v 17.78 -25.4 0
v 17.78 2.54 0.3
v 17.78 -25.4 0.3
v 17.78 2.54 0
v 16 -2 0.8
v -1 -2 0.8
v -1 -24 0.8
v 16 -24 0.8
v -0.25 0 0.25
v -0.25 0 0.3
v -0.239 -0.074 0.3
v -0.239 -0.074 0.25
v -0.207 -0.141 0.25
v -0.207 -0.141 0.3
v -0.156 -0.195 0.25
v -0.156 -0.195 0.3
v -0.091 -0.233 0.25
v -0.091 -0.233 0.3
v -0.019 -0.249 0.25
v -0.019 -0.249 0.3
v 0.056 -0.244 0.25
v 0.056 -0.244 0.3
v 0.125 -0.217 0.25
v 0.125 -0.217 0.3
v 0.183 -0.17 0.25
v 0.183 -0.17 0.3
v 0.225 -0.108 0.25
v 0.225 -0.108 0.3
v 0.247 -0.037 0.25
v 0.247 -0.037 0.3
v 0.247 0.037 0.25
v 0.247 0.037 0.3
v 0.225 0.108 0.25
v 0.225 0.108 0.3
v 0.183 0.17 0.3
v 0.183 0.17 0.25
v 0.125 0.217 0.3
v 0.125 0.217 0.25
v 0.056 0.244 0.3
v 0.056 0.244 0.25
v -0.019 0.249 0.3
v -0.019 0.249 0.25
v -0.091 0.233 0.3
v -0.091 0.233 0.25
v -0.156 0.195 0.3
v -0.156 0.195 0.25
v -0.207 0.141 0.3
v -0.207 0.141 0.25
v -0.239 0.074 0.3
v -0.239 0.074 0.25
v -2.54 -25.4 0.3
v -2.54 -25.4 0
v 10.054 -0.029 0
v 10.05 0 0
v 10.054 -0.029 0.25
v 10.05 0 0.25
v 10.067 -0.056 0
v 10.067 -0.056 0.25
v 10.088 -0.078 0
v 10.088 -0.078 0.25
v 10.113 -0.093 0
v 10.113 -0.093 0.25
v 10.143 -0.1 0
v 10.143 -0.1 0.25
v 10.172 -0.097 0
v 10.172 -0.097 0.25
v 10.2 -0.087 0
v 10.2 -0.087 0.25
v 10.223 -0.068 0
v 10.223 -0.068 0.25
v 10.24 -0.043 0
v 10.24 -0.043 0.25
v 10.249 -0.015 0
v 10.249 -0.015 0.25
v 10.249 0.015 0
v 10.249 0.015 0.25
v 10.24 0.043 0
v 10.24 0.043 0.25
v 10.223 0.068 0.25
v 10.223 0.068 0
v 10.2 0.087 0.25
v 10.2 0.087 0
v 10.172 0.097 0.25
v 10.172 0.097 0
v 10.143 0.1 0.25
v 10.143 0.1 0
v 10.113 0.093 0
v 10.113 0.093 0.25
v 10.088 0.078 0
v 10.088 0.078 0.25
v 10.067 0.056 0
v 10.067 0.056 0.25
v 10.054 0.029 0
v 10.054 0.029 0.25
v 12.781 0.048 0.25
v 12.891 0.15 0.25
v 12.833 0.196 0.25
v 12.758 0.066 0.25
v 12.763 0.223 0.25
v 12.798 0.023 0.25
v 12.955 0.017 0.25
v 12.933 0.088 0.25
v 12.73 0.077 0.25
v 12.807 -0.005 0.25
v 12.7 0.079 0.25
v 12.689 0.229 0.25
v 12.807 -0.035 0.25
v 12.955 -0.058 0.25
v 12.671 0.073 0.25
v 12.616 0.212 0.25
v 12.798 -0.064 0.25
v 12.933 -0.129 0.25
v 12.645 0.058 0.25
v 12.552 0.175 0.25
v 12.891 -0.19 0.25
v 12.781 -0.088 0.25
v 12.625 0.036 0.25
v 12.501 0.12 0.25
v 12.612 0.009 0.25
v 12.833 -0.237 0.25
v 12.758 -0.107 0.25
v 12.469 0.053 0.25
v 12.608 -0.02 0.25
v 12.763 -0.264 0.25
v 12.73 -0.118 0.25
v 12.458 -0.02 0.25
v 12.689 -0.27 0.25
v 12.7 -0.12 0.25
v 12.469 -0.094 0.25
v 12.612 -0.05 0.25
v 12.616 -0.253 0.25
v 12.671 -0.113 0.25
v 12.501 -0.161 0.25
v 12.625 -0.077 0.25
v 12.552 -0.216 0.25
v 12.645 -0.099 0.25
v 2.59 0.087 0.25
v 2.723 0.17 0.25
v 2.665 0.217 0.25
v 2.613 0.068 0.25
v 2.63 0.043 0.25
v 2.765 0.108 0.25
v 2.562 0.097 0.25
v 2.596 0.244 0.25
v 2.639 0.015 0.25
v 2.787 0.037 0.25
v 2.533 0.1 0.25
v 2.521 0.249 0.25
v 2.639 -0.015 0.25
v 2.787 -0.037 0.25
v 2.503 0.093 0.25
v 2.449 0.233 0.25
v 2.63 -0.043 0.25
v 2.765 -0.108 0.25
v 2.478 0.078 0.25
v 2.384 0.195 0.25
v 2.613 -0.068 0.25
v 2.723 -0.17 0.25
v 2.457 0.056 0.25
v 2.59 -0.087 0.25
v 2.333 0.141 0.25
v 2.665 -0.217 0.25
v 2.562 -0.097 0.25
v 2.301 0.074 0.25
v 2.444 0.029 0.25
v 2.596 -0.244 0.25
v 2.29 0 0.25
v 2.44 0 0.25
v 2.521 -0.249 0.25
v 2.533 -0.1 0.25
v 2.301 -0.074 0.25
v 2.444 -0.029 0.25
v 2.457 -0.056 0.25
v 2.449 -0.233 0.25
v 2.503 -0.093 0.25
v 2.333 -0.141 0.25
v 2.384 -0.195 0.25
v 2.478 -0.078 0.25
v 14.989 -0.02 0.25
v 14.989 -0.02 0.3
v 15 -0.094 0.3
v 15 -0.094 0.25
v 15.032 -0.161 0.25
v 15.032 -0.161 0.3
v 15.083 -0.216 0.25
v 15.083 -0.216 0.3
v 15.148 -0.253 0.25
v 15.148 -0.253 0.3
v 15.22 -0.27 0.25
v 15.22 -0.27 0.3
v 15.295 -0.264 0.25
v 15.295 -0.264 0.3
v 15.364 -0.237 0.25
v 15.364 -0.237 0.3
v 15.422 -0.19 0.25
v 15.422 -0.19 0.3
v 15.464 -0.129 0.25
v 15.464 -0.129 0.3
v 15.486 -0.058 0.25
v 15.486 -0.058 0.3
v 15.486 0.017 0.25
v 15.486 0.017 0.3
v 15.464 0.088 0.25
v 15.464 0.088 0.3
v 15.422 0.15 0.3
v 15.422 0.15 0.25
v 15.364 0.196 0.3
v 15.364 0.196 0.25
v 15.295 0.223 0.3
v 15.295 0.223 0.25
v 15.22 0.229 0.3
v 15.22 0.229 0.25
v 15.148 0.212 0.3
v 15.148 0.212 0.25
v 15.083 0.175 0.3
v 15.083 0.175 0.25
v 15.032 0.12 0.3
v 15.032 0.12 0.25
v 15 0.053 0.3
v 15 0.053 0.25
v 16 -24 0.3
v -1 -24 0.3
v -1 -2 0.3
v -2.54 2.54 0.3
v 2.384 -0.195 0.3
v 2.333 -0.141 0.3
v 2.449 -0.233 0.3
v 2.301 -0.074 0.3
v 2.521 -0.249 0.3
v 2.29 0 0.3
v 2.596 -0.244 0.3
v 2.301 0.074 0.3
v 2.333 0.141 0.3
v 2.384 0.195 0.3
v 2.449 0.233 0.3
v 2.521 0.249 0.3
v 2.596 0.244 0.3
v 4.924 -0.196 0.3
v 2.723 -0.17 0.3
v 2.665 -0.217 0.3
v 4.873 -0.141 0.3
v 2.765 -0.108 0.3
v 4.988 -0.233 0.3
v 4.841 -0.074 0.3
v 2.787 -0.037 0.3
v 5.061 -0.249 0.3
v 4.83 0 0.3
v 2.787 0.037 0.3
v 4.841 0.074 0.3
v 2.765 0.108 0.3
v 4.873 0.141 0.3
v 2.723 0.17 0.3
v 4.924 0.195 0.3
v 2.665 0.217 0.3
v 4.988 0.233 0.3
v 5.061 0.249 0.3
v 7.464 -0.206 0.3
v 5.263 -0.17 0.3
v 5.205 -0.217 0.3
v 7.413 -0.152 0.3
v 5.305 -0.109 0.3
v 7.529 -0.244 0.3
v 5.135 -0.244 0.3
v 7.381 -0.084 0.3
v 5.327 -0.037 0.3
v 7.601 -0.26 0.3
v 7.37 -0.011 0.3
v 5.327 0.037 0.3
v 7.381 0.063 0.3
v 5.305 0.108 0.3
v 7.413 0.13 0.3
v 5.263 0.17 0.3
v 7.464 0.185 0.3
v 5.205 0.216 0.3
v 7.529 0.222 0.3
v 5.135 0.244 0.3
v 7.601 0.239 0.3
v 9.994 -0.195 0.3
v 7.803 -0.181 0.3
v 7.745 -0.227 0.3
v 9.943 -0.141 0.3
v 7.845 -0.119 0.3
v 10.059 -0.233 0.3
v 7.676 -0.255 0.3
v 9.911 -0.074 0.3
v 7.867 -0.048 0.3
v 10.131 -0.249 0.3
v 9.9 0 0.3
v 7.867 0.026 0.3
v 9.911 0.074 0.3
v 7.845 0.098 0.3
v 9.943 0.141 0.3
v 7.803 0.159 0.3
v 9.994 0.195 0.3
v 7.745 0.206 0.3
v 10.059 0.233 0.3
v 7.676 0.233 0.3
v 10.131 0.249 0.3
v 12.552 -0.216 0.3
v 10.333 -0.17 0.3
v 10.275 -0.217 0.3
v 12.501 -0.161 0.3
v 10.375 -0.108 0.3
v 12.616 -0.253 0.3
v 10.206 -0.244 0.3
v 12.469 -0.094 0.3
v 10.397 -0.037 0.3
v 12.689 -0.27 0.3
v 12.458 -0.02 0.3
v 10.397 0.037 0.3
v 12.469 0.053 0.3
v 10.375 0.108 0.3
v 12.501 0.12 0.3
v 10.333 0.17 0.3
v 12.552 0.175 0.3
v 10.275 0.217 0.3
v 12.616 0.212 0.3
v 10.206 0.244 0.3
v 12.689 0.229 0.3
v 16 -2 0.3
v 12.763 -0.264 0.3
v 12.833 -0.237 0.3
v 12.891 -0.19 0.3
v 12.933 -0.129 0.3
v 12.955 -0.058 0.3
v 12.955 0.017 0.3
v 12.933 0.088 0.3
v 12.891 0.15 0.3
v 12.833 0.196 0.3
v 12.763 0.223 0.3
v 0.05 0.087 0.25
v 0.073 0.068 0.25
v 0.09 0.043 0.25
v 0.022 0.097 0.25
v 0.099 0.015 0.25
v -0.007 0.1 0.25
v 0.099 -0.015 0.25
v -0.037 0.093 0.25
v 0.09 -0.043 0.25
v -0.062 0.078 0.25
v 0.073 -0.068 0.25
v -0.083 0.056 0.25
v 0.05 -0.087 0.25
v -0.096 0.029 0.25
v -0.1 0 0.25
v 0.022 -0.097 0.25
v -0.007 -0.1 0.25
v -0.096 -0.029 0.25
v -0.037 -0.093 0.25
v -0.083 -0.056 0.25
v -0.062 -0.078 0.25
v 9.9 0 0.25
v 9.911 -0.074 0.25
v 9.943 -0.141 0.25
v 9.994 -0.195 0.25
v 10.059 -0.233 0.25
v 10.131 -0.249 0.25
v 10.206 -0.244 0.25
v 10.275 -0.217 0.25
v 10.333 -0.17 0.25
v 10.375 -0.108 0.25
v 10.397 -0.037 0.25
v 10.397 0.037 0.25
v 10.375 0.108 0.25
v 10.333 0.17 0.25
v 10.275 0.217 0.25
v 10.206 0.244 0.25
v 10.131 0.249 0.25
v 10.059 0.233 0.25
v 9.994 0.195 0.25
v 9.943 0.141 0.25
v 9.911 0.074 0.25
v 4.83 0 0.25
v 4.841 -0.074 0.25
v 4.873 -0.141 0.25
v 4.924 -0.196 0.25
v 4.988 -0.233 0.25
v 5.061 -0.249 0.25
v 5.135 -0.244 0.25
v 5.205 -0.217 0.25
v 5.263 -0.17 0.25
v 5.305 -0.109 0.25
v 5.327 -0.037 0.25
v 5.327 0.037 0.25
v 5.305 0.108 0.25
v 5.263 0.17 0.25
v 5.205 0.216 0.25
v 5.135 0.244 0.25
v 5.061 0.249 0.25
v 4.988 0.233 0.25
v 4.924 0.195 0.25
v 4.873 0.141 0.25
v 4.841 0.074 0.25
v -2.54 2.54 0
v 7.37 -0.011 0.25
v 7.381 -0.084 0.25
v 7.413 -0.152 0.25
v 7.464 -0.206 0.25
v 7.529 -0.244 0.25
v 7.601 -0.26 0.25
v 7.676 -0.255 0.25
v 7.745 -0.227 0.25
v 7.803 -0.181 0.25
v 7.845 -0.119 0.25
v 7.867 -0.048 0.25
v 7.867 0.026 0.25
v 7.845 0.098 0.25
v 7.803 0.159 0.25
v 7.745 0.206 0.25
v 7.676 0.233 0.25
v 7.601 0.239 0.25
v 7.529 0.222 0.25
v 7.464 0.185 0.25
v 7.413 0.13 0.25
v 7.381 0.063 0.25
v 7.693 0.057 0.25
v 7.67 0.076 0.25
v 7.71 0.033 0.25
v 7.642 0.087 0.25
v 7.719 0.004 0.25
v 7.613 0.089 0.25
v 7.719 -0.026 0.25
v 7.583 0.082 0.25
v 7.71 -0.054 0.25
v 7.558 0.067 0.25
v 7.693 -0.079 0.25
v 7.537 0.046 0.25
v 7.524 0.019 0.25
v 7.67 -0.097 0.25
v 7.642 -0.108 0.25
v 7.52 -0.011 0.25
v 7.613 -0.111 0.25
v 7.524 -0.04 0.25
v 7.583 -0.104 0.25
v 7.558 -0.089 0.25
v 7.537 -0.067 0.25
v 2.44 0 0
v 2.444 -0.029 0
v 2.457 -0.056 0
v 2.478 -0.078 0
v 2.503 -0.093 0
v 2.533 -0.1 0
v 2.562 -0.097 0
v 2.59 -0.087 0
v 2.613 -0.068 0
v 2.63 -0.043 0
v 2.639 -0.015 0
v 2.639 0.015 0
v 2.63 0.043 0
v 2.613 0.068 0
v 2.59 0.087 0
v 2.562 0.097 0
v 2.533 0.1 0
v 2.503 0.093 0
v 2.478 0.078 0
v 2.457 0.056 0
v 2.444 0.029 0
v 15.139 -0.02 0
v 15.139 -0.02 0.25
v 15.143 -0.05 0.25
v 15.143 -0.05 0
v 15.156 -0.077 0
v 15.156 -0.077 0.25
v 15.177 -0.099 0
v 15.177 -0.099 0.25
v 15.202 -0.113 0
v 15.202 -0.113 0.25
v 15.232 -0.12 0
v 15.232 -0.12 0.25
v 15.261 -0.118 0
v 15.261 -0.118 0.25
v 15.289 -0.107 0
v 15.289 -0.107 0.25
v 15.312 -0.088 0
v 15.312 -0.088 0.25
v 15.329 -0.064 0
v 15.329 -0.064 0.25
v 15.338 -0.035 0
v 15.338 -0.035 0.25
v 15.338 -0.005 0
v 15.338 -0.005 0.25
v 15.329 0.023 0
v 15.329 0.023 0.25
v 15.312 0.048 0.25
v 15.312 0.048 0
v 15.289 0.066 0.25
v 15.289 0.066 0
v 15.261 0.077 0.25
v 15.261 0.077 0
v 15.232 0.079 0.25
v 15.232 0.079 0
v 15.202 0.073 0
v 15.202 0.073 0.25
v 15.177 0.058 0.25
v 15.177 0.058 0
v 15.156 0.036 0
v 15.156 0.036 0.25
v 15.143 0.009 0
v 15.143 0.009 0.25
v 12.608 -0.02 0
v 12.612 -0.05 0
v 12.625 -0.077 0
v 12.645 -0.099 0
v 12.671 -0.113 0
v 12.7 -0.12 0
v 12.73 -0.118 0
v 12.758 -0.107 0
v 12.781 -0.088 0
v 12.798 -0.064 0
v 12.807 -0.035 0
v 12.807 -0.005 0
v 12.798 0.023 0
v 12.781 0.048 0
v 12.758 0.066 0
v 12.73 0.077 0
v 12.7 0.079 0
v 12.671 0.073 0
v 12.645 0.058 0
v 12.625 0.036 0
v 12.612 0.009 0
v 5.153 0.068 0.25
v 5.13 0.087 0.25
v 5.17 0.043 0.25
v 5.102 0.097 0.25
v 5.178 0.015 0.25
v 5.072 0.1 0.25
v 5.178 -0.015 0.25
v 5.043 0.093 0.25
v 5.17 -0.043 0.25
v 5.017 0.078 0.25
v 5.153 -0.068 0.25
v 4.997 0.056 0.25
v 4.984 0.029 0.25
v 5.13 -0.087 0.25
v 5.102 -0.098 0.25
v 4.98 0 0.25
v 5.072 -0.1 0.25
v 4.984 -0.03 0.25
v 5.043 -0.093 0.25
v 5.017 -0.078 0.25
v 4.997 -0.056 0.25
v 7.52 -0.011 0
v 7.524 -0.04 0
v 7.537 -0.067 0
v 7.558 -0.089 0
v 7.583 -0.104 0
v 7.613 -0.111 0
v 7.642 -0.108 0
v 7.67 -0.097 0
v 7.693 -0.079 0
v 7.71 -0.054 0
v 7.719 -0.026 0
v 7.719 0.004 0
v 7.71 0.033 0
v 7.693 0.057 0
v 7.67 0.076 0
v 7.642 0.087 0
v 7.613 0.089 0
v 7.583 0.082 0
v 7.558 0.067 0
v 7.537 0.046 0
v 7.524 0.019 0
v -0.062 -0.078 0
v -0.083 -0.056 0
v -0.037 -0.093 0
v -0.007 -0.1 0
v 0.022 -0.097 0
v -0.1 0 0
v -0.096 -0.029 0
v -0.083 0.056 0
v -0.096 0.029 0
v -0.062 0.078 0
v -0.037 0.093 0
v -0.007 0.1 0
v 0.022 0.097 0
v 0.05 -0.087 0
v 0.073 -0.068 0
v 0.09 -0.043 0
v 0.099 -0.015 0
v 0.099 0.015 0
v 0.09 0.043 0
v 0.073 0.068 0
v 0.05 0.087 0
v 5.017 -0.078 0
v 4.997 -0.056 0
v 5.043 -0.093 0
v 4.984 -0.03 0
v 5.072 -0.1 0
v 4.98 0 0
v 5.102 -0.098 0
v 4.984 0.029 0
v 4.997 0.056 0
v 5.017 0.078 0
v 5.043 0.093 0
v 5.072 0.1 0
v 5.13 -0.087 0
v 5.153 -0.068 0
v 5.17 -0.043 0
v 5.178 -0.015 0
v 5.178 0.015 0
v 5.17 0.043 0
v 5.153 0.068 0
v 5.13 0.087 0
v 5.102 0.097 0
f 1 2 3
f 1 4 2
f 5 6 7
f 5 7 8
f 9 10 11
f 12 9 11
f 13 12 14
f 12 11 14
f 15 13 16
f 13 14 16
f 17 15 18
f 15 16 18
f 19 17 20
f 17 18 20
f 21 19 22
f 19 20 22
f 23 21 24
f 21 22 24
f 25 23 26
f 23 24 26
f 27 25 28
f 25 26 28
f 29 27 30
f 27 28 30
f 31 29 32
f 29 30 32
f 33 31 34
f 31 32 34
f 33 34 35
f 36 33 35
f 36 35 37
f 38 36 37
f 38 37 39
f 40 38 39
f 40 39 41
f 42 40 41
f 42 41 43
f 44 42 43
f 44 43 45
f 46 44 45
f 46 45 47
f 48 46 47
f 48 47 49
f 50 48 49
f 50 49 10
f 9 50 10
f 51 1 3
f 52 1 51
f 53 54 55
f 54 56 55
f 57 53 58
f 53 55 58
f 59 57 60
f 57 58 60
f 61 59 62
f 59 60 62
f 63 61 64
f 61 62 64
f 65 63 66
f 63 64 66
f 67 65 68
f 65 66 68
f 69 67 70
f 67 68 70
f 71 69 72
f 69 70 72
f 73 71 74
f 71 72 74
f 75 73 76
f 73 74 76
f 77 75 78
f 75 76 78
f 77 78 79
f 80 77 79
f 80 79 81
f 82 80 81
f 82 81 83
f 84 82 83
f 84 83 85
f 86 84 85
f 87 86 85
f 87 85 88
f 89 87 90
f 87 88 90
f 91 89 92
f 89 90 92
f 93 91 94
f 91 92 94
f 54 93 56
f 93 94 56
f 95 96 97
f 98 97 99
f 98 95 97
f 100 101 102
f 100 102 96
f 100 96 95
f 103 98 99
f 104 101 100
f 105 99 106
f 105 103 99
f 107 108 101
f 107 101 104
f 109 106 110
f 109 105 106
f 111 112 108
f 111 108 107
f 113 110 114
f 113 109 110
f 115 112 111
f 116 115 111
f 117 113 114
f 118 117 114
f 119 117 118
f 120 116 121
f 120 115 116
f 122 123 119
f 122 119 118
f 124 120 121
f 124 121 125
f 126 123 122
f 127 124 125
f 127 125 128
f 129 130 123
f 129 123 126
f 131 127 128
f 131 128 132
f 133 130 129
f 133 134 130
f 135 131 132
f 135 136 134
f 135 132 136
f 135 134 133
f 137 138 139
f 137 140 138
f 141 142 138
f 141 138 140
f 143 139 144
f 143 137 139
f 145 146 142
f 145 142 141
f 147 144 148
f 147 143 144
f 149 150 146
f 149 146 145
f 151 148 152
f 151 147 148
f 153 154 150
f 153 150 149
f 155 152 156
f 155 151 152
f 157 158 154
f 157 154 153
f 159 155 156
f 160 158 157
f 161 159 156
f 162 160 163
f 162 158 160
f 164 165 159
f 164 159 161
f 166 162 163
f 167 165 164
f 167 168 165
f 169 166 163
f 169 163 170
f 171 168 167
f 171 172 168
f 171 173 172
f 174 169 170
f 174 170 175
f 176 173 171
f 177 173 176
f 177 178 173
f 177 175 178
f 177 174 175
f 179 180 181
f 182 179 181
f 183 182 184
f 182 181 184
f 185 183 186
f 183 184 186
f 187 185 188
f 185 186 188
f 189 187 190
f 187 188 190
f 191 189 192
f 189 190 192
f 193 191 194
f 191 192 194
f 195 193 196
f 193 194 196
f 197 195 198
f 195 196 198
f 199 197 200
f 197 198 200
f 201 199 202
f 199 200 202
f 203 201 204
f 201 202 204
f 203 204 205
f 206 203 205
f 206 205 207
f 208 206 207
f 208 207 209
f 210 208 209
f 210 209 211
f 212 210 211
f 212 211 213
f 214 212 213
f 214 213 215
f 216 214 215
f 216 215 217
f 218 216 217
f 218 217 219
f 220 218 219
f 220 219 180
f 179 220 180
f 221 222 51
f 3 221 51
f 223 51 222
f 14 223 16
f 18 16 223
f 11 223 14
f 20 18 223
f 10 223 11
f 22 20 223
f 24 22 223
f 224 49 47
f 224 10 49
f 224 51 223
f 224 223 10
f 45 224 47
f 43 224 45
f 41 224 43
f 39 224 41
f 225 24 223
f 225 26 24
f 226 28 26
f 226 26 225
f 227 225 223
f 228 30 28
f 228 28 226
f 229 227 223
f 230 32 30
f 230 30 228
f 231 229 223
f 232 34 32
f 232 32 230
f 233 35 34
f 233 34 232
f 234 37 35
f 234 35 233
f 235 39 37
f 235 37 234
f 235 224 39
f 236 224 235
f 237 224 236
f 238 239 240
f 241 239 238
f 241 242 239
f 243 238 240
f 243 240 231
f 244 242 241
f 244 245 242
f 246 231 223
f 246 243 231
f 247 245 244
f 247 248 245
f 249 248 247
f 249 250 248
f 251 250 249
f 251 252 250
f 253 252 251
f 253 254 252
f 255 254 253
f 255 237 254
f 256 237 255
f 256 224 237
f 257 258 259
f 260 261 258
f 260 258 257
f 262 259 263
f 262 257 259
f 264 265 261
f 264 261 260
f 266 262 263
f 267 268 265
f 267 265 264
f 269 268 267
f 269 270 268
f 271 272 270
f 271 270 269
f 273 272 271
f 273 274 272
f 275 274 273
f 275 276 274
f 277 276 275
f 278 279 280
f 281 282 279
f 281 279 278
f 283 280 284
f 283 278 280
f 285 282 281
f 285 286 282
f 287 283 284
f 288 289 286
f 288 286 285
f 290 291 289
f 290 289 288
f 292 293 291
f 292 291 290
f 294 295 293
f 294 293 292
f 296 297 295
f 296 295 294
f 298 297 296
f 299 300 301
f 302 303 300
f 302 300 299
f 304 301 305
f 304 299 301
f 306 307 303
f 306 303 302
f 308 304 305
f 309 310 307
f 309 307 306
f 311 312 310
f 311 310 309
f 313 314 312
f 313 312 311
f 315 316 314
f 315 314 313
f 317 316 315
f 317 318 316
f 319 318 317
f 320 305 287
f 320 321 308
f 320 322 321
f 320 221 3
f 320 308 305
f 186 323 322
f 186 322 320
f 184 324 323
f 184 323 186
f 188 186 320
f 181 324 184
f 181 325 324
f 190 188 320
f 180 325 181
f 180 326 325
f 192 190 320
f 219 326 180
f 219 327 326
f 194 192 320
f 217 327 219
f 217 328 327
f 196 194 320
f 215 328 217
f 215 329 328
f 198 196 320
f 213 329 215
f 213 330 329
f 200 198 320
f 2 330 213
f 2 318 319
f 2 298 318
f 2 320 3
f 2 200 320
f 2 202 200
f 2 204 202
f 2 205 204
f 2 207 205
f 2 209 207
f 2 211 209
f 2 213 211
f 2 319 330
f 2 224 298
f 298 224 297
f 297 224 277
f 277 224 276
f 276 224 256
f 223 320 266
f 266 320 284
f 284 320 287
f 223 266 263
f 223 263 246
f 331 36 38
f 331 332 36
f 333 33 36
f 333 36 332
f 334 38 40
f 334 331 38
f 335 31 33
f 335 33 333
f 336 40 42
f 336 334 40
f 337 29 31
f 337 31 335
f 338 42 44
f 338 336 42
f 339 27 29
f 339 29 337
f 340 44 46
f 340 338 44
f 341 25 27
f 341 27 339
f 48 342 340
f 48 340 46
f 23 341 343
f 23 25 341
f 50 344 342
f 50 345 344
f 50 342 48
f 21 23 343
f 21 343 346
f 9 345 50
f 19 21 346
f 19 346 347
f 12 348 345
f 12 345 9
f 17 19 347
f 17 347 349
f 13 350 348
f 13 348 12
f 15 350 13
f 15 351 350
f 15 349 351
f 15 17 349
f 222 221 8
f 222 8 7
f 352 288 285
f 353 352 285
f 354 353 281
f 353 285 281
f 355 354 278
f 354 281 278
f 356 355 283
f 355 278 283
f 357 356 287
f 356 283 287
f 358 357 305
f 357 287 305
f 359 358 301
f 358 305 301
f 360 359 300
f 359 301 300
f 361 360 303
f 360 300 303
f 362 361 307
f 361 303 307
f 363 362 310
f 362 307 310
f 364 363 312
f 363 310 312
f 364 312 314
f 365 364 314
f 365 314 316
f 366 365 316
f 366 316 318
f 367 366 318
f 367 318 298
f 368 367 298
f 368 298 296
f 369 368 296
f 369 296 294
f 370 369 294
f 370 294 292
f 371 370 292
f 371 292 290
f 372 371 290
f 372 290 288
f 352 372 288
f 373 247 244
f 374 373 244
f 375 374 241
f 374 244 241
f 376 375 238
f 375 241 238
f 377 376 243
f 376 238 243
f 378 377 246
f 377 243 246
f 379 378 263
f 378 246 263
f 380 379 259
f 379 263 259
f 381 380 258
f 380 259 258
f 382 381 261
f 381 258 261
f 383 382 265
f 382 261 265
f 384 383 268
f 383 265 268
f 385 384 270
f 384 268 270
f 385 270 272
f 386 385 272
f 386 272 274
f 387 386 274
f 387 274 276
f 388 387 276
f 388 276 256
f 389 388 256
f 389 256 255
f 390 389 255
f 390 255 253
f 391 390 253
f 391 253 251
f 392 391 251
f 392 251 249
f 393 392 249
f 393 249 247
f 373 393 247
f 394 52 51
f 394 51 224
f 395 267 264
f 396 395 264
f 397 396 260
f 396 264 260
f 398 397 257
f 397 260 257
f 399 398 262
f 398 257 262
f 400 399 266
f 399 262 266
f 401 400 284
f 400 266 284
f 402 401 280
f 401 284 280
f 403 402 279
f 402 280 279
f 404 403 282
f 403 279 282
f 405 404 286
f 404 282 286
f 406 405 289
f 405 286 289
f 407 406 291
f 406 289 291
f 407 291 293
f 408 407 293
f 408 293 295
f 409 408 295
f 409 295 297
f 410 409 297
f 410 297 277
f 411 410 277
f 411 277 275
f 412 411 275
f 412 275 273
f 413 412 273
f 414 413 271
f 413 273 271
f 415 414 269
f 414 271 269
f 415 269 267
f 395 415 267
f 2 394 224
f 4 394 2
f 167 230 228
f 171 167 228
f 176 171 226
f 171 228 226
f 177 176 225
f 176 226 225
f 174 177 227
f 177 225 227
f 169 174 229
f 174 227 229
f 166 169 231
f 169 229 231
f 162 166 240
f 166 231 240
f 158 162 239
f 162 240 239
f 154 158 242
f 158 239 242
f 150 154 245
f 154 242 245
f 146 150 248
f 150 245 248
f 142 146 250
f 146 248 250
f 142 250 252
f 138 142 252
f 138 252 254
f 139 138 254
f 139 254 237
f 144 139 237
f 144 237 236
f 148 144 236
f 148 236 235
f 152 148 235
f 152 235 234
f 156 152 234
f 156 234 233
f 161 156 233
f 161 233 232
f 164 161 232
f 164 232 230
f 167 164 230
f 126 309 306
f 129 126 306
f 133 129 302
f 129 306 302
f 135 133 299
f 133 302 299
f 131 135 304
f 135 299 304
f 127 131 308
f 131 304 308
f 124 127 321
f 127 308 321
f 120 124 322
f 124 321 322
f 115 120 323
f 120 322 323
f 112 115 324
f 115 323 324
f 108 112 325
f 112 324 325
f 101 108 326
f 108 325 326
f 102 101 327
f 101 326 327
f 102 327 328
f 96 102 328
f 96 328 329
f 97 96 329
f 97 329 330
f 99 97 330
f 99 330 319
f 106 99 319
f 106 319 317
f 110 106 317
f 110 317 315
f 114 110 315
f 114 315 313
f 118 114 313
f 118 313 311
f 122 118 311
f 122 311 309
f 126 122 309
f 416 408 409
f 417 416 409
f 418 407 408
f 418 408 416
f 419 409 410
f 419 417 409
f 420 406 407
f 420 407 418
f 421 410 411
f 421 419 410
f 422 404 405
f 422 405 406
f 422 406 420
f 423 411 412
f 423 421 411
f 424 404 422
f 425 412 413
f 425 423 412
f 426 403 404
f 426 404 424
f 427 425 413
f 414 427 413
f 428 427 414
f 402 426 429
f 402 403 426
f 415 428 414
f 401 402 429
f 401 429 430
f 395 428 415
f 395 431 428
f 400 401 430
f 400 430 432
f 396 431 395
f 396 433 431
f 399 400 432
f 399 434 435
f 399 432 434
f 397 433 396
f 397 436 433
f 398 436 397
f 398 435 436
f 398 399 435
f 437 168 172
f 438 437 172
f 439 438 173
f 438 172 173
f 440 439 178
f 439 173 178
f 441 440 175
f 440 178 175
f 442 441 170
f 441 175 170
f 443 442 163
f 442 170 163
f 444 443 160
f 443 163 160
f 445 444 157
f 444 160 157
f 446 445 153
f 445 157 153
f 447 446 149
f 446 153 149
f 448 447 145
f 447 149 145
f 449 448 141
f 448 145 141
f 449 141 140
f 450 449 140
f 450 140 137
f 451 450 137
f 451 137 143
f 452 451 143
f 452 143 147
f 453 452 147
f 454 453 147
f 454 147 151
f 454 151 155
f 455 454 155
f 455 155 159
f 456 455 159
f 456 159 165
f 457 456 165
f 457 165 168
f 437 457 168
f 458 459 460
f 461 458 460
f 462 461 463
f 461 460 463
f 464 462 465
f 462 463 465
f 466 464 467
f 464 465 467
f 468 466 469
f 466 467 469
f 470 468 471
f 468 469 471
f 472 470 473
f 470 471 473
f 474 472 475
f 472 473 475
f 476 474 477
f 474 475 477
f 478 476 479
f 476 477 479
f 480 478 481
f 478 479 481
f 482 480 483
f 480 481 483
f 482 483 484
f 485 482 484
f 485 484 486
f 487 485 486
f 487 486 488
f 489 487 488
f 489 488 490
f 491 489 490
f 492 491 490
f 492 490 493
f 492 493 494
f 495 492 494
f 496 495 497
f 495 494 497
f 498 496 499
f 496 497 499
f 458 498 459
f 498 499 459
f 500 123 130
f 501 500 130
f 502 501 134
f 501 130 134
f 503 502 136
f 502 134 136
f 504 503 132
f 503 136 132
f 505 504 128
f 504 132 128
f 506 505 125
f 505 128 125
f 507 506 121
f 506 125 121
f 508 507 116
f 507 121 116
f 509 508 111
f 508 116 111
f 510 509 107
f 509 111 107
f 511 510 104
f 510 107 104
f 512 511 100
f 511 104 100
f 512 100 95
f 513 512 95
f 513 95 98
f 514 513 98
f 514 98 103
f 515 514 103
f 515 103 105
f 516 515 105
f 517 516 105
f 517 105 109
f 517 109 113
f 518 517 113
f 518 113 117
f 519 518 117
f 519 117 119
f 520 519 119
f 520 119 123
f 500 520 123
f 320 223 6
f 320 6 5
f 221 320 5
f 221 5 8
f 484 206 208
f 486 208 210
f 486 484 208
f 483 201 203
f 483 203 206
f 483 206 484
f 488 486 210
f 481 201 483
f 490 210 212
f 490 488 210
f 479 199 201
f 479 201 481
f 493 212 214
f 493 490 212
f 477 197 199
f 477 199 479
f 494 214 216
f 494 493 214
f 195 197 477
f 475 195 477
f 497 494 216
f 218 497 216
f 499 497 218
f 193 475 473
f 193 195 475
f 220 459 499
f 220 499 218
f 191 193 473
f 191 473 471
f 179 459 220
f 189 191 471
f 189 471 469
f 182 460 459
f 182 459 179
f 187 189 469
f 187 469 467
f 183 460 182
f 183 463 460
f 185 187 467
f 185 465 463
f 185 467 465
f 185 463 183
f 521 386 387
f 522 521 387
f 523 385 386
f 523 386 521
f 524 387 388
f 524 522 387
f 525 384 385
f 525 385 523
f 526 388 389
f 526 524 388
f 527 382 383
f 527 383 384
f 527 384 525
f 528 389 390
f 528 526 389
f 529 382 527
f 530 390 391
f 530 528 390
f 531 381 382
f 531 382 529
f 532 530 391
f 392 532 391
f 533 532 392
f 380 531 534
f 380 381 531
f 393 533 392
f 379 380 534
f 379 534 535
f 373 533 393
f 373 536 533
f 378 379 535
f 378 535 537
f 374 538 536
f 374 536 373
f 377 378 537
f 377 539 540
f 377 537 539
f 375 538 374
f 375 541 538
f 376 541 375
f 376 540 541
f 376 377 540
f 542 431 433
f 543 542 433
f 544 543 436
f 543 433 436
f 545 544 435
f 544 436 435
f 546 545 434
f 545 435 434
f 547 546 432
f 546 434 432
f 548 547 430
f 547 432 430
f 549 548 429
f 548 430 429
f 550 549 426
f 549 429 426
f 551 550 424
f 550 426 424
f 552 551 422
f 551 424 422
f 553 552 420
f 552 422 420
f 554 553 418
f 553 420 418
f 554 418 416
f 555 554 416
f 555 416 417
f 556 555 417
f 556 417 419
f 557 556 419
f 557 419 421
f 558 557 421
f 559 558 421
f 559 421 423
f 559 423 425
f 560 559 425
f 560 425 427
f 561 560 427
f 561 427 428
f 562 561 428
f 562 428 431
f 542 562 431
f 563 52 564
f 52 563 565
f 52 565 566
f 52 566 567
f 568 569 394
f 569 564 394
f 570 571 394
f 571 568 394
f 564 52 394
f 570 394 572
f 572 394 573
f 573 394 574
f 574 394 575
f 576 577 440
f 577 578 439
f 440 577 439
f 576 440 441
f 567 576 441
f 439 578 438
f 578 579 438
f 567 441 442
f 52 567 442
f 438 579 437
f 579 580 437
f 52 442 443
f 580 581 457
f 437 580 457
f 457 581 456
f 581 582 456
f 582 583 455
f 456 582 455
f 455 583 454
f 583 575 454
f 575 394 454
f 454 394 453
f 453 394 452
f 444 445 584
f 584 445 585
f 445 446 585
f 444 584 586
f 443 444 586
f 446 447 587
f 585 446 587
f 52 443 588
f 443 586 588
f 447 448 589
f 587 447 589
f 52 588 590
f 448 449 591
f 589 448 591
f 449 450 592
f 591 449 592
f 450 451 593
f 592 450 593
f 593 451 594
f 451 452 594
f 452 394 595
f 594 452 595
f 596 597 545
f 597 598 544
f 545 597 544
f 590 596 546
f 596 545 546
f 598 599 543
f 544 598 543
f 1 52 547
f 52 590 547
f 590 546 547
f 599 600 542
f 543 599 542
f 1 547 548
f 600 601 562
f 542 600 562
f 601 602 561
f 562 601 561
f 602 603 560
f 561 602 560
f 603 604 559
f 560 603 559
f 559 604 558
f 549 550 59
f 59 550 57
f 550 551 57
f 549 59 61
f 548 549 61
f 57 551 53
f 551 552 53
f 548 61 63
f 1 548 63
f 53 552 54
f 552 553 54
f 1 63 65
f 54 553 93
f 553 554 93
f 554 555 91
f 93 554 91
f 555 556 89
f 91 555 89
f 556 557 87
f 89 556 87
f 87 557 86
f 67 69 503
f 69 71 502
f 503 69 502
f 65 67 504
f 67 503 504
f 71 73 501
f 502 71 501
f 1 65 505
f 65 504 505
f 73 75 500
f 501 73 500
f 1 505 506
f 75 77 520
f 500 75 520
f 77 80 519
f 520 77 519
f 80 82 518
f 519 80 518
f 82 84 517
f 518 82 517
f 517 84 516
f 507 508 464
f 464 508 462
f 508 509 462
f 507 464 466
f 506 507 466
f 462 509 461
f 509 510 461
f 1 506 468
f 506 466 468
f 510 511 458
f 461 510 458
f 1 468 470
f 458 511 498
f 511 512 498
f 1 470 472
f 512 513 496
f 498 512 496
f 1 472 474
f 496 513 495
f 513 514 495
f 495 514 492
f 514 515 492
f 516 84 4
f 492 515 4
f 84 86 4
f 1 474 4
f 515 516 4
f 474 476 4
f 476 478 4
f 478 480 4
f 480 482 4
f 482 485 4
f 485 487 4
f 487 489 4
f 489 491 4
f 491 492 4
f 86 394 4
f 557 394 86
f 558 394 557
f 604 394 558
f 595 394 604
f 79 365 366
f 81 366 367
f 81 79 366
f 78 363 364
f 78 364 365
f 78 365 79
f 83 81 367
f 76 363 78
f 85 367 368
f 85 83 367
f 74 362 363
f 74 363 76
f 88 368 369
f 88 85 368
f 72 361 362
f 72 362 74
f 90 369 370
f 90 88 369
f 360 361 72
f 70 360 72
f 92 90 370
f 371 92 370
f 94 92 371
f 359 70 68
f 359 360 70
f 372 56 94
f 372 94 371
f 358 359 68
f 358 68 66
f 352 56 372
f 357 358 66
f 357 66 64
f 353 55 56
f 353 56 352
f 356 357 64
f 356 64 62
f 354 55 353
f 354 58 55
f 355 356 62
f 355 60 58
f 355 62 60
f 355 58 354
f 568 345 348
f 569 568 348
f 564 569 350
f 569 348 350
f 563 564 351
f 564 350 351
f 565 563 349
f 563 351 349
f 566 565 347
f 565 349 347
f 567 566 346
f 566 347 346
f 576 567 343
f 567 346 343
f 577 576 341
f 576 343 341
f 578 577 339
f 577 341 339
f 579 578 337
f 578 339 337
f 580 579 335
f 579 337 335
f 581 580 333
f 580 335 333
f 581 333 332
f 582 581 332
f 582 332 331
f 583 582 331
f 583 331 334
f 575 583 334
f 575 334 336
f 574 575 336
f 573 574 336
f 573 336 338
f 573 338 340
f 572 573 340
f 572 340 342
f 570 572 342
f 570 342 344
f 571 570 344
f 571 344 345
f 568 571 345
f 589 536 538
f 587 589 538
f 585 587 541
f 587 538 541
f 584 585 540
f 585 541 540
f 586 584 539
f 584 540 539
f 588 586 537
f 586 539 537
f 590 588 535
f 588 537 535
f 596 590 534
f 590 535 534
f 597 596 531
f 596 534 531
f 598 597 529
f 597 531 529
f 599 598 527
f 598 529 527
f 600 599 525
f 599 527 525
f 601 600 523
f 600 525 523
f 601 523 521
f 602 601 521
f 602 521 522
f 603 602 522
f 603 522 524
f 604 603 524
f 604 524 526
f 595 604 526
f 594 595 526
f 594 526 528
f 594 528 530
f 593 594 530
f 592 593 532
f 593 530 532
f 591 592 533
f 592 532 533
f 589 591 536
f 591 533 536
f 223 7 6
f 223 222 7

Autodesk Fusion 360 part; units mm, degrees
sketch "Esboço1" plane through (0, 0, 0) normal (0, 0, 1) x (1, 0, 0)
  line L0 (-2.54, 2.54) -> (17.78, 2.54)
  line L1 (17.78, 2.54) -> (17.78, -25.4)
  line L2 (17.78, -25.4) -> (-2.54, -25.4)
  line L3 (-2.54, -25.4) -> (-2.54, 2.54)
extrude "Extrusão1" add sketch "Esboço1" along normal blind 0.3
sketch "Esboço2" plane through (0, 0, 0) normal (0, 0, 1) x (1, 0, 0)
  line L0 (-1, -2) -> (16, -2)
  line L1 (16, -2) -> (16, -24)
  line L2 (16, -24) -> (-1, -24)
  line L3 (-1, -24) -> (-1, -2)
extrude "Extrusão2" add sketch "Esboço2" along normal blind 0.8
sketch "Esboço3" plane through (0, 0, 0.3) normal (0, 0, 1) x (-1, 0, 0)
  line L0 (1, 24) -> (1, 2)
  line L1 (1, 2) -> (-16, 2)
  line L2 (-16, 2) -> (-16, 24)
  line L3 (-16, 24) -> (1, 24)
  line L4 (2.54, 25.4) -> (-17.78, 25.4)
  line L5 (-17.78, 25.4) -> (-17.78, -2.54)
  line L6 (-17.78, -2.54) -> (2.54, -2.54)
  line L7 (2.54, -2.54) -> (2.54, 25.4)
  circle A0 centre (0, 0) radius 0.25
  circle A1 centre (-2.5, 0) radius 0.25
  curve A2
  circle A3 centre (-7.62, 0.0108) radius 0.25
  circle A4 centre (-10.15, 0) radius 0.25
  circle A5 centre (-12.7077, 0.0204) radius 0.25
  circle A6 centre (-15.239, 0.0204) radius 0.25
  dimension "d5" = 0.5
  dimension "d6" = 0.5
  dimension "d7" = 0.5
  dimension "d8" = 0.5
  dimension "d9" = 0.5
  dimension "d10" = 0.5
  dimension "d11" = 0.5
extrude "Extrusão3" cut sketch "Esboço3" against normal blind 0.05 contours A3 | A4 | A5 | A6
sketch "Esboço4" plane through (0, 0, 0.3) normal (0, 0, 1) x (-1, 0, 0)
  circle A0 centre (-12.7077, 0.0204) radius 0.25
  circle A1 centre (-10.15, 0) radius 0.25
  circle A2 centre (-15.239, 0.0204) radius 0.25
  circle A3 centre (-7.62, 0.0108) radius 0.25
  line L0 (1, 24) -> (1, 2)
  line L1 (1, 2) -> (-16, 2)
  line L2 (-16, 2) -> (-16, 24)
  line L3 (-16, 24) -> (1, 24)
  line L4 (2.54, 25.4) -> (-17.78, 25.4)
  line L5 (-17.78, 25.4) -> (-17.78, -2.54)
  line L6 (-17.78, -2.54) -> (2.54, -2.54)
  line L7 (2.54, -2.54) -> (2.54, 25.4)
  circle A4 centre (-5.0796, 0.0001) radius 0.25
  circle A5 centre (-2.54, 0) radius 0.25
  circle A6 centre (0, 0) radius 0.25
  dimension "d14" = 0.5
  dimension "d15" = 0.5
  dimension "d16" = 0.5
extrude "Extrusão4" cut sketch "Esboço4" against normal blind 0.05 contours A4 | A5 | A6
sketch "Esboço5" plane through (0, 0, 0.3) normal (0, 0, 1) x (-1, 0, 0)
  circle A0 centre (-5.0796, 0.0001) radius 0.25
  circle A1 centre (-2.54, 0) radius 0.25
  circle A2 centre (0, 0) radius 0.25
  circle A3 centre (-12.7077, 0.0204) radius 0.25
  circle A4 centre (-10.15, 0) radius 0.25
  circle A5 centre (-15.239, 0.0204) radius 0.25
  circle A6 centre (-7.62, 0.0108) radius 0.25
  line L0 (1, 24) -> (1, 2)
  line L1 (1, 2) -> (-16, 2)
  line L2 (-16, 2) -> (-16, 24)
  line L3 (-16, 24) -> (1, 24)
  line L4 (2.54, 25.4) -> (-17.78, 25.4)
  line L5 (-17.78, 25.4) -> (-17.78, -2.54)
  line L6 (-17.78, -2.54) -> (2.54, -2.54)
  line L7 (2.54, -2.54) -> (2.54, 25.4)
  circle A7 centre (0, 0) radius 0.1
  circle A8 centre (-2.54, 0) radius 0.1
  circle A9 centre (-5.0796, 0.0001) radius 0.1
  circle A10 centre (-7.62, 0.0108) radius 0.1
  circle A11 centre (-10.15, 0) radius 0.1
  circle A12 centre (-12.7077, 0.0204) radius 0.1
  circle A13 centre (-15.239, 0.0204) radius 0.1
  dimension "d19" = 0.2
  dimension "d20" = 0.2
  dimension "d21" = 0.2
  dimension "d22" = 0.2
  dimension "d23" = 0.2
  dimension "d24" = 0.2
  dimension "d25" = 0.2
extrude "Extrusão5" cut sketch "Esboço5" against normal blind 2 contours A7 | A8 | A9 | A10 | A11 | A12 | A13
